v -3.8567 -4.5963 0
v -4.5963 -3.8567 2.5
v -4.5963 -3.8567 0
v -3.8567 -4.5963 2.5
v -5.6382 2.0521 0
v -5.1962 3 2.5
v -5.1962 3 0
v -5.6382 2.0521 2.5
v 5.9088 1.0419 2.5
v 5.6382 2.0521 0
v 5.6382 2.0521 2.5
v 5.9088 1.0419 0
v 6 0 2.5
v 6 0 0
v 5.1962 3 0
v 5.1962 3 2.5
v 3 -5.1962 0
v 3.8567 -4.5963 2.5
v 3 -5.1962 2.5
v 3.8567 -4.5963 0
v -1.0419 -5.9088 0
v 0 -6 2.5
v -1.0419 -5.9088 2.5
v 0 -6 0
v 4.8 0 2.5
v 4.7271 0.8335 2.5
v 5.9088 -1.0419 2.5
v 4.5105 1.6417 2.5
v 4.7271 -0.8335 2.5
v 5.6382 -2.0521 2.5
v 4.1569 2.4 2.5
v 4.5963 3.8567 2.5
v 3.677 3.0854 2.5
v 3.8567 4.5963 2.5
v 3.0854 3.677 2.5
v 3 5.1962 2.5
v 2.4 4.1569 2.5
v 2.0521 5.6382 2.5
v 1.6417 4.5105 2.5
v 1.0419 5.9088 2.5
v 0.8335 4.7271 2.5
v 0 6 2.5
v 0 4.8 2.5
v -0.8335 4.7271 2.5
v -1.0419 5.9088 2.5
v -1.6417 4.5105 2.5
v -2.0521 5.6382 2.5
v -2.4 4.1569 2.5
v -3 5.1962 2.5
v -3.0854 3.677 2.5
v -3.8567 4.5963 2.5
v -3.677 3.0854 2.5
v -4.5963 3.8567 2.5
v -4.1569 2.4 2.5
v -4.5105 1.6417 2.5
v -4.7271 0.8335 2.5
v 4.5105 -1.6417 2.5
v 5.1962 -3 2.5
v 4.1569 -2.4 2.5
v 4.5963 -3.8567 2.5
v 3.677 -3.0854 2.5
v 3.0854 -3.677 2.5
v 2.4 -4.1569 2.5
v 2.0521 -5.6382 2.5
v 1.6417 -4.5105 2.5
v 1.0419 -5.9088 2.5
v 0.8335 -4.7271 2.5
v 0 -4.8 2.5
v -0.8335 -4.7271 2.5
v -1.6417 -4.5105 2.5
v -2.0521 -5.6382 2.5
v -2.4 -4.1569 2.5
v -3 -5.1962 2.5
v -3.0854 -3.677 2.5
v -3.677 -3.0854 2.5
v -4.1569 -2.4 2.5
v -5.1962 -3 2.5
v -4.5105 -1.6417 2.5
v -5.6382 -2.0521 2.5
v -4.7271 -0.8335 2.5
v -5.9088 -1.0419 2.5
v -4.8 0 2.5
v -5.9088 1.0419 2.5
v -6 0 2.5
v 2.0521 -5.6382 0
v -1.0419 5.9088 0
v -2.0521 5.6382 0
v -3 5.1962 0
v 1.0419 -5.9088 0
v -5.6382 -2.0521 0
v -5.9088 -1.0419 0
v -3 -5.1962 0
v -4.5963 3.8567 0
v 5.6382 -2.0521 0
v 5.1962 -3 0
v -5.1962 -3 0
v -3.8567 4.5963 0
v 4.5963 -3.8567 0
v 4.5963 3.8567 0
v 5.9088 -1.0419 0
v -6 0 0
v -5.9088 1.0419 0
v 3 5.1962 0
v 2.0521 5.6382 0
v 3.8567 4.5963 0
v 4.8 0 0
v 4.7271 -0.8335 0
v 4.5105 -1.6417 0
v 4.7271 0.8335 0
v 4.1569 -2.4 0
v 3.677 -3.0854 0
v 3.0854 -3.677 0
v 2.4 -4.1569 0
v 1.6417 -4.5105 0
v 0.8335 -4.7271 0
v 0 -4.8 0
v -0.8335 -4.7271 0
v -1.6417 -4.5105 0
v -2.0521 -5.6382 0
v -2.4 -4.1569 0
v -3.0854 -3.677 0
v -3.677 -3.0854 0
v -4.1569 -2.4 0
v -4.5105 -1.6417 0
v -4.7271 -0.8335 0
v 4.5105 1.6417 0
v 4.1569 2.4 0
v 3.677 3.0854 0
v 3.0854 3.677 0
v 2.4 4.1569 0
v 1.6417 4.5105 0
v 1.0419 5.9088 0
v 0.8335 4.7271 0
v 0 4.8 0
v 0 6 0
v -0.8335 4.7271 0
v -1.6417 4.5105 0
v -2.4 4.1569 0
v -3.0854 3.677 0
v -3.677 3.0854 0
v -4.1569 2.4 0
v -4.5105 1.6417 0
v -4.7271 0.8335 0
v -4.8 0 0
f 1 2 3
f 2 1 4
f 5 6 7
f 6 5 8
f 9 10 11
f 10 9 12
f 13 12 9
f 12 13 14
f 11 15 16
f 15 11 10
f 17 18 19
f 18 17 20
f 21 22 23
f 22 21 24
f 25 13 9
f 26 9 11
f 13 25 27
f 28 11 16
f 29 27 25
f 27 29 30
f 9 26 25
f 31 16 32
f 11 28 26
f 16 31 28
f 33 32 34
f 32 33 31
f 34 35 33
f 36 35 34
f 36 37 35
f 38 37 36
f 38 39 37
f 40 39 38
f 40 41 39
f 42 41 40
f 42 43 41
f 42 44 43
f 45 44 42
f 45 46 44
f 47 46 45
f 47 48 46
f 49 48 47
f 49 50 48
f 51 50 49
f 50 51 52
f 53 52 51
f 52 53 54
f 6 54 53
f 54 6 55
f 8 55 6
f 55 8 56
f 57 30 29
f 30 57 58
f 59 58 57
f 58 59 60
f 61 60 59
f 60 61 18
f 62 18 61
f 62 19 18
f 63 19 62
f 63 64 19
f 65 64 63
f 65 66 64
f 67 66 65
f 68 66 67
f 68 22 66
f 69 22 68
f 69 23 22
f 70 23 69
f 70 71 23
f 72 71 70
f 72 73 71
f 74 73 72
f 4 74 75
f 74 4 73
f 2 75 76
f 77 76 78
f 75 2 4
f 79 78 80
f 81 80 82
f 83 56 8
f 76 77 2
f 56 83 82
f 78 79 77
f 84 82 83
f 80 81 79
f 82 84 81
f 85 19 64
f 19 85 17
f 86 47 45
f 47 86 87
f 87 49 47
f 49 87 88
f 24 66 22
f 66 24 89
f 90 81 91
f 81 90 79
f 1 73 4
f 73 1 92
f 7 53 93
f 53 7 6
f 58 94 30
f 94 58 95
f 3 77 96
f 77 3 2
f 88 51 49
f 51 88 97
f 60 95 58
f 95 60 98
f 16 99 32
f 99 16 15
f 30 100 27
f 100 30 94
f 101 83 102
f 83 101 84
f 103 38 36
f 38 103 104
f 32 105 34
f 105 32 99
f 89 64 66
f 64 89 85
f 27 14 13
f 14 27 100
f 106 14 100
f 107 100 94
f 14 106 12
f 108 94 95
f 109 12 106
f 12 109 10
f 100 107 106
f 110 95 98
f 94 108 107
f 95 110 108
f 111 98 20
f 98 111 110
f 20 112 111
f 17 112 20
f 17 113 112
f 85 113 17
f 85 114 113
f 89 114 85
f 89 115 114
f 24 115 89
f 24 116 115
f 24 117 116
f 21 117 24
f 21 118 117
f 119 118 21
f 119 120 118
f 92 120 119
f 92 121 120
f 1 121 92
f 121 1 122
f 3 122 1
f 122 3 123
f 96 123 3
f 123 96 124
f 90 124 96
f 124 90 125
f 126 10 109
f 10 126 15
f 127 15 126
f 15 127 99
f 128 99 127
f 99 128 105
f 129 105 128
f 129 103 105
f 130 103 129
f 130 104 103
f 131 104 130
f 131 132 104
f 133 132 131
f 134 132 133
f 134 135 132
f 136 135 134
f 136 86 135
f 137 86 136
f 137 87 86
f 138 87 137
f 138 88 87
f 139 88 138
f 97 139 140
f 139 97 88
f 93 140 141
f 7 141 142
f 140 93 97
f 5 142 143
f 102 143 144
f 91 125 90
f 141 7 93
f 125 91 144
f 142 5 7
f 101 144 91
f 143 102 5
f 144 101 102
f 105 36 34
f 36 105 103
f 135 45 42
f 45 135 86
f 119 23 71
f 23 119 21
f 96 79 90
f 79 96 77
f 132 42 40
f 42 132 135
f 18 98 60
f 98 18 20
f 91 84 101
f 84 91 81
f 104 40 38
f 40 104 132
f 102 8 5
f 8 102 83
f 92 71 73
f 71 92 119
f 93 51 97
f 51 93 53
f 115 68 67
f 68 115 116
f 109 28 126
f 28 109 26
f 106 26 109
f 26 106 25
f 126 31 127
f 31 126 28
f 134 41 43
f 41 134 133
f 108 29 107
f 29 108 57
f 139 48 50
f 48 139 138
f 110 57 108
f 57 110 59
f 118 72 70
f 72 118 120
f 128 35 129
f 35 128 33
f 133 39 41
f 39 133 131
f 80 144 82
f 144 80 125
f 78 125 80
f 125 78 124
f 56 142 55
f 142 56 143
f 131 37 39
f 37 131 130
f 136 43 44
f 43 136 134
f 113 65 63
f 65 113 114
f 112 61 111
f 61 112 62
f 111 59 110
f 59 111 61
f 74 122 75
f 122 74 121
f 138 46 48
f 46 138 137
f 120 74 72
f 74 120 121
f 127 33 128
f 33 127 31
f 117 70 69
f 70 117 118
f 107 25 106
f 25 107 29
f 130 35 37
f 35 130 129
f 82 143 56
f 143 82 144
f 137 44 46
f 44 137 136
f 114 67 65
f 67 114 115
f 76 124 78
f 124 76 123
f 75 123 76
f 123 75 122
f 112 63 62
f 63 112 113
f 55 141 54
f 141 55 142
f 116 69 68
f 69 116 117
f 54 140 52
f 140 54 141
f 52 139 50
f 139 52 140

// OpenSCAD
difference() {
  cylinder(h=2.5, r=6, $fn=36);
  translate([0,0,-1]) cylinder(h=4.5, r=4.8, $fn=36);
}
